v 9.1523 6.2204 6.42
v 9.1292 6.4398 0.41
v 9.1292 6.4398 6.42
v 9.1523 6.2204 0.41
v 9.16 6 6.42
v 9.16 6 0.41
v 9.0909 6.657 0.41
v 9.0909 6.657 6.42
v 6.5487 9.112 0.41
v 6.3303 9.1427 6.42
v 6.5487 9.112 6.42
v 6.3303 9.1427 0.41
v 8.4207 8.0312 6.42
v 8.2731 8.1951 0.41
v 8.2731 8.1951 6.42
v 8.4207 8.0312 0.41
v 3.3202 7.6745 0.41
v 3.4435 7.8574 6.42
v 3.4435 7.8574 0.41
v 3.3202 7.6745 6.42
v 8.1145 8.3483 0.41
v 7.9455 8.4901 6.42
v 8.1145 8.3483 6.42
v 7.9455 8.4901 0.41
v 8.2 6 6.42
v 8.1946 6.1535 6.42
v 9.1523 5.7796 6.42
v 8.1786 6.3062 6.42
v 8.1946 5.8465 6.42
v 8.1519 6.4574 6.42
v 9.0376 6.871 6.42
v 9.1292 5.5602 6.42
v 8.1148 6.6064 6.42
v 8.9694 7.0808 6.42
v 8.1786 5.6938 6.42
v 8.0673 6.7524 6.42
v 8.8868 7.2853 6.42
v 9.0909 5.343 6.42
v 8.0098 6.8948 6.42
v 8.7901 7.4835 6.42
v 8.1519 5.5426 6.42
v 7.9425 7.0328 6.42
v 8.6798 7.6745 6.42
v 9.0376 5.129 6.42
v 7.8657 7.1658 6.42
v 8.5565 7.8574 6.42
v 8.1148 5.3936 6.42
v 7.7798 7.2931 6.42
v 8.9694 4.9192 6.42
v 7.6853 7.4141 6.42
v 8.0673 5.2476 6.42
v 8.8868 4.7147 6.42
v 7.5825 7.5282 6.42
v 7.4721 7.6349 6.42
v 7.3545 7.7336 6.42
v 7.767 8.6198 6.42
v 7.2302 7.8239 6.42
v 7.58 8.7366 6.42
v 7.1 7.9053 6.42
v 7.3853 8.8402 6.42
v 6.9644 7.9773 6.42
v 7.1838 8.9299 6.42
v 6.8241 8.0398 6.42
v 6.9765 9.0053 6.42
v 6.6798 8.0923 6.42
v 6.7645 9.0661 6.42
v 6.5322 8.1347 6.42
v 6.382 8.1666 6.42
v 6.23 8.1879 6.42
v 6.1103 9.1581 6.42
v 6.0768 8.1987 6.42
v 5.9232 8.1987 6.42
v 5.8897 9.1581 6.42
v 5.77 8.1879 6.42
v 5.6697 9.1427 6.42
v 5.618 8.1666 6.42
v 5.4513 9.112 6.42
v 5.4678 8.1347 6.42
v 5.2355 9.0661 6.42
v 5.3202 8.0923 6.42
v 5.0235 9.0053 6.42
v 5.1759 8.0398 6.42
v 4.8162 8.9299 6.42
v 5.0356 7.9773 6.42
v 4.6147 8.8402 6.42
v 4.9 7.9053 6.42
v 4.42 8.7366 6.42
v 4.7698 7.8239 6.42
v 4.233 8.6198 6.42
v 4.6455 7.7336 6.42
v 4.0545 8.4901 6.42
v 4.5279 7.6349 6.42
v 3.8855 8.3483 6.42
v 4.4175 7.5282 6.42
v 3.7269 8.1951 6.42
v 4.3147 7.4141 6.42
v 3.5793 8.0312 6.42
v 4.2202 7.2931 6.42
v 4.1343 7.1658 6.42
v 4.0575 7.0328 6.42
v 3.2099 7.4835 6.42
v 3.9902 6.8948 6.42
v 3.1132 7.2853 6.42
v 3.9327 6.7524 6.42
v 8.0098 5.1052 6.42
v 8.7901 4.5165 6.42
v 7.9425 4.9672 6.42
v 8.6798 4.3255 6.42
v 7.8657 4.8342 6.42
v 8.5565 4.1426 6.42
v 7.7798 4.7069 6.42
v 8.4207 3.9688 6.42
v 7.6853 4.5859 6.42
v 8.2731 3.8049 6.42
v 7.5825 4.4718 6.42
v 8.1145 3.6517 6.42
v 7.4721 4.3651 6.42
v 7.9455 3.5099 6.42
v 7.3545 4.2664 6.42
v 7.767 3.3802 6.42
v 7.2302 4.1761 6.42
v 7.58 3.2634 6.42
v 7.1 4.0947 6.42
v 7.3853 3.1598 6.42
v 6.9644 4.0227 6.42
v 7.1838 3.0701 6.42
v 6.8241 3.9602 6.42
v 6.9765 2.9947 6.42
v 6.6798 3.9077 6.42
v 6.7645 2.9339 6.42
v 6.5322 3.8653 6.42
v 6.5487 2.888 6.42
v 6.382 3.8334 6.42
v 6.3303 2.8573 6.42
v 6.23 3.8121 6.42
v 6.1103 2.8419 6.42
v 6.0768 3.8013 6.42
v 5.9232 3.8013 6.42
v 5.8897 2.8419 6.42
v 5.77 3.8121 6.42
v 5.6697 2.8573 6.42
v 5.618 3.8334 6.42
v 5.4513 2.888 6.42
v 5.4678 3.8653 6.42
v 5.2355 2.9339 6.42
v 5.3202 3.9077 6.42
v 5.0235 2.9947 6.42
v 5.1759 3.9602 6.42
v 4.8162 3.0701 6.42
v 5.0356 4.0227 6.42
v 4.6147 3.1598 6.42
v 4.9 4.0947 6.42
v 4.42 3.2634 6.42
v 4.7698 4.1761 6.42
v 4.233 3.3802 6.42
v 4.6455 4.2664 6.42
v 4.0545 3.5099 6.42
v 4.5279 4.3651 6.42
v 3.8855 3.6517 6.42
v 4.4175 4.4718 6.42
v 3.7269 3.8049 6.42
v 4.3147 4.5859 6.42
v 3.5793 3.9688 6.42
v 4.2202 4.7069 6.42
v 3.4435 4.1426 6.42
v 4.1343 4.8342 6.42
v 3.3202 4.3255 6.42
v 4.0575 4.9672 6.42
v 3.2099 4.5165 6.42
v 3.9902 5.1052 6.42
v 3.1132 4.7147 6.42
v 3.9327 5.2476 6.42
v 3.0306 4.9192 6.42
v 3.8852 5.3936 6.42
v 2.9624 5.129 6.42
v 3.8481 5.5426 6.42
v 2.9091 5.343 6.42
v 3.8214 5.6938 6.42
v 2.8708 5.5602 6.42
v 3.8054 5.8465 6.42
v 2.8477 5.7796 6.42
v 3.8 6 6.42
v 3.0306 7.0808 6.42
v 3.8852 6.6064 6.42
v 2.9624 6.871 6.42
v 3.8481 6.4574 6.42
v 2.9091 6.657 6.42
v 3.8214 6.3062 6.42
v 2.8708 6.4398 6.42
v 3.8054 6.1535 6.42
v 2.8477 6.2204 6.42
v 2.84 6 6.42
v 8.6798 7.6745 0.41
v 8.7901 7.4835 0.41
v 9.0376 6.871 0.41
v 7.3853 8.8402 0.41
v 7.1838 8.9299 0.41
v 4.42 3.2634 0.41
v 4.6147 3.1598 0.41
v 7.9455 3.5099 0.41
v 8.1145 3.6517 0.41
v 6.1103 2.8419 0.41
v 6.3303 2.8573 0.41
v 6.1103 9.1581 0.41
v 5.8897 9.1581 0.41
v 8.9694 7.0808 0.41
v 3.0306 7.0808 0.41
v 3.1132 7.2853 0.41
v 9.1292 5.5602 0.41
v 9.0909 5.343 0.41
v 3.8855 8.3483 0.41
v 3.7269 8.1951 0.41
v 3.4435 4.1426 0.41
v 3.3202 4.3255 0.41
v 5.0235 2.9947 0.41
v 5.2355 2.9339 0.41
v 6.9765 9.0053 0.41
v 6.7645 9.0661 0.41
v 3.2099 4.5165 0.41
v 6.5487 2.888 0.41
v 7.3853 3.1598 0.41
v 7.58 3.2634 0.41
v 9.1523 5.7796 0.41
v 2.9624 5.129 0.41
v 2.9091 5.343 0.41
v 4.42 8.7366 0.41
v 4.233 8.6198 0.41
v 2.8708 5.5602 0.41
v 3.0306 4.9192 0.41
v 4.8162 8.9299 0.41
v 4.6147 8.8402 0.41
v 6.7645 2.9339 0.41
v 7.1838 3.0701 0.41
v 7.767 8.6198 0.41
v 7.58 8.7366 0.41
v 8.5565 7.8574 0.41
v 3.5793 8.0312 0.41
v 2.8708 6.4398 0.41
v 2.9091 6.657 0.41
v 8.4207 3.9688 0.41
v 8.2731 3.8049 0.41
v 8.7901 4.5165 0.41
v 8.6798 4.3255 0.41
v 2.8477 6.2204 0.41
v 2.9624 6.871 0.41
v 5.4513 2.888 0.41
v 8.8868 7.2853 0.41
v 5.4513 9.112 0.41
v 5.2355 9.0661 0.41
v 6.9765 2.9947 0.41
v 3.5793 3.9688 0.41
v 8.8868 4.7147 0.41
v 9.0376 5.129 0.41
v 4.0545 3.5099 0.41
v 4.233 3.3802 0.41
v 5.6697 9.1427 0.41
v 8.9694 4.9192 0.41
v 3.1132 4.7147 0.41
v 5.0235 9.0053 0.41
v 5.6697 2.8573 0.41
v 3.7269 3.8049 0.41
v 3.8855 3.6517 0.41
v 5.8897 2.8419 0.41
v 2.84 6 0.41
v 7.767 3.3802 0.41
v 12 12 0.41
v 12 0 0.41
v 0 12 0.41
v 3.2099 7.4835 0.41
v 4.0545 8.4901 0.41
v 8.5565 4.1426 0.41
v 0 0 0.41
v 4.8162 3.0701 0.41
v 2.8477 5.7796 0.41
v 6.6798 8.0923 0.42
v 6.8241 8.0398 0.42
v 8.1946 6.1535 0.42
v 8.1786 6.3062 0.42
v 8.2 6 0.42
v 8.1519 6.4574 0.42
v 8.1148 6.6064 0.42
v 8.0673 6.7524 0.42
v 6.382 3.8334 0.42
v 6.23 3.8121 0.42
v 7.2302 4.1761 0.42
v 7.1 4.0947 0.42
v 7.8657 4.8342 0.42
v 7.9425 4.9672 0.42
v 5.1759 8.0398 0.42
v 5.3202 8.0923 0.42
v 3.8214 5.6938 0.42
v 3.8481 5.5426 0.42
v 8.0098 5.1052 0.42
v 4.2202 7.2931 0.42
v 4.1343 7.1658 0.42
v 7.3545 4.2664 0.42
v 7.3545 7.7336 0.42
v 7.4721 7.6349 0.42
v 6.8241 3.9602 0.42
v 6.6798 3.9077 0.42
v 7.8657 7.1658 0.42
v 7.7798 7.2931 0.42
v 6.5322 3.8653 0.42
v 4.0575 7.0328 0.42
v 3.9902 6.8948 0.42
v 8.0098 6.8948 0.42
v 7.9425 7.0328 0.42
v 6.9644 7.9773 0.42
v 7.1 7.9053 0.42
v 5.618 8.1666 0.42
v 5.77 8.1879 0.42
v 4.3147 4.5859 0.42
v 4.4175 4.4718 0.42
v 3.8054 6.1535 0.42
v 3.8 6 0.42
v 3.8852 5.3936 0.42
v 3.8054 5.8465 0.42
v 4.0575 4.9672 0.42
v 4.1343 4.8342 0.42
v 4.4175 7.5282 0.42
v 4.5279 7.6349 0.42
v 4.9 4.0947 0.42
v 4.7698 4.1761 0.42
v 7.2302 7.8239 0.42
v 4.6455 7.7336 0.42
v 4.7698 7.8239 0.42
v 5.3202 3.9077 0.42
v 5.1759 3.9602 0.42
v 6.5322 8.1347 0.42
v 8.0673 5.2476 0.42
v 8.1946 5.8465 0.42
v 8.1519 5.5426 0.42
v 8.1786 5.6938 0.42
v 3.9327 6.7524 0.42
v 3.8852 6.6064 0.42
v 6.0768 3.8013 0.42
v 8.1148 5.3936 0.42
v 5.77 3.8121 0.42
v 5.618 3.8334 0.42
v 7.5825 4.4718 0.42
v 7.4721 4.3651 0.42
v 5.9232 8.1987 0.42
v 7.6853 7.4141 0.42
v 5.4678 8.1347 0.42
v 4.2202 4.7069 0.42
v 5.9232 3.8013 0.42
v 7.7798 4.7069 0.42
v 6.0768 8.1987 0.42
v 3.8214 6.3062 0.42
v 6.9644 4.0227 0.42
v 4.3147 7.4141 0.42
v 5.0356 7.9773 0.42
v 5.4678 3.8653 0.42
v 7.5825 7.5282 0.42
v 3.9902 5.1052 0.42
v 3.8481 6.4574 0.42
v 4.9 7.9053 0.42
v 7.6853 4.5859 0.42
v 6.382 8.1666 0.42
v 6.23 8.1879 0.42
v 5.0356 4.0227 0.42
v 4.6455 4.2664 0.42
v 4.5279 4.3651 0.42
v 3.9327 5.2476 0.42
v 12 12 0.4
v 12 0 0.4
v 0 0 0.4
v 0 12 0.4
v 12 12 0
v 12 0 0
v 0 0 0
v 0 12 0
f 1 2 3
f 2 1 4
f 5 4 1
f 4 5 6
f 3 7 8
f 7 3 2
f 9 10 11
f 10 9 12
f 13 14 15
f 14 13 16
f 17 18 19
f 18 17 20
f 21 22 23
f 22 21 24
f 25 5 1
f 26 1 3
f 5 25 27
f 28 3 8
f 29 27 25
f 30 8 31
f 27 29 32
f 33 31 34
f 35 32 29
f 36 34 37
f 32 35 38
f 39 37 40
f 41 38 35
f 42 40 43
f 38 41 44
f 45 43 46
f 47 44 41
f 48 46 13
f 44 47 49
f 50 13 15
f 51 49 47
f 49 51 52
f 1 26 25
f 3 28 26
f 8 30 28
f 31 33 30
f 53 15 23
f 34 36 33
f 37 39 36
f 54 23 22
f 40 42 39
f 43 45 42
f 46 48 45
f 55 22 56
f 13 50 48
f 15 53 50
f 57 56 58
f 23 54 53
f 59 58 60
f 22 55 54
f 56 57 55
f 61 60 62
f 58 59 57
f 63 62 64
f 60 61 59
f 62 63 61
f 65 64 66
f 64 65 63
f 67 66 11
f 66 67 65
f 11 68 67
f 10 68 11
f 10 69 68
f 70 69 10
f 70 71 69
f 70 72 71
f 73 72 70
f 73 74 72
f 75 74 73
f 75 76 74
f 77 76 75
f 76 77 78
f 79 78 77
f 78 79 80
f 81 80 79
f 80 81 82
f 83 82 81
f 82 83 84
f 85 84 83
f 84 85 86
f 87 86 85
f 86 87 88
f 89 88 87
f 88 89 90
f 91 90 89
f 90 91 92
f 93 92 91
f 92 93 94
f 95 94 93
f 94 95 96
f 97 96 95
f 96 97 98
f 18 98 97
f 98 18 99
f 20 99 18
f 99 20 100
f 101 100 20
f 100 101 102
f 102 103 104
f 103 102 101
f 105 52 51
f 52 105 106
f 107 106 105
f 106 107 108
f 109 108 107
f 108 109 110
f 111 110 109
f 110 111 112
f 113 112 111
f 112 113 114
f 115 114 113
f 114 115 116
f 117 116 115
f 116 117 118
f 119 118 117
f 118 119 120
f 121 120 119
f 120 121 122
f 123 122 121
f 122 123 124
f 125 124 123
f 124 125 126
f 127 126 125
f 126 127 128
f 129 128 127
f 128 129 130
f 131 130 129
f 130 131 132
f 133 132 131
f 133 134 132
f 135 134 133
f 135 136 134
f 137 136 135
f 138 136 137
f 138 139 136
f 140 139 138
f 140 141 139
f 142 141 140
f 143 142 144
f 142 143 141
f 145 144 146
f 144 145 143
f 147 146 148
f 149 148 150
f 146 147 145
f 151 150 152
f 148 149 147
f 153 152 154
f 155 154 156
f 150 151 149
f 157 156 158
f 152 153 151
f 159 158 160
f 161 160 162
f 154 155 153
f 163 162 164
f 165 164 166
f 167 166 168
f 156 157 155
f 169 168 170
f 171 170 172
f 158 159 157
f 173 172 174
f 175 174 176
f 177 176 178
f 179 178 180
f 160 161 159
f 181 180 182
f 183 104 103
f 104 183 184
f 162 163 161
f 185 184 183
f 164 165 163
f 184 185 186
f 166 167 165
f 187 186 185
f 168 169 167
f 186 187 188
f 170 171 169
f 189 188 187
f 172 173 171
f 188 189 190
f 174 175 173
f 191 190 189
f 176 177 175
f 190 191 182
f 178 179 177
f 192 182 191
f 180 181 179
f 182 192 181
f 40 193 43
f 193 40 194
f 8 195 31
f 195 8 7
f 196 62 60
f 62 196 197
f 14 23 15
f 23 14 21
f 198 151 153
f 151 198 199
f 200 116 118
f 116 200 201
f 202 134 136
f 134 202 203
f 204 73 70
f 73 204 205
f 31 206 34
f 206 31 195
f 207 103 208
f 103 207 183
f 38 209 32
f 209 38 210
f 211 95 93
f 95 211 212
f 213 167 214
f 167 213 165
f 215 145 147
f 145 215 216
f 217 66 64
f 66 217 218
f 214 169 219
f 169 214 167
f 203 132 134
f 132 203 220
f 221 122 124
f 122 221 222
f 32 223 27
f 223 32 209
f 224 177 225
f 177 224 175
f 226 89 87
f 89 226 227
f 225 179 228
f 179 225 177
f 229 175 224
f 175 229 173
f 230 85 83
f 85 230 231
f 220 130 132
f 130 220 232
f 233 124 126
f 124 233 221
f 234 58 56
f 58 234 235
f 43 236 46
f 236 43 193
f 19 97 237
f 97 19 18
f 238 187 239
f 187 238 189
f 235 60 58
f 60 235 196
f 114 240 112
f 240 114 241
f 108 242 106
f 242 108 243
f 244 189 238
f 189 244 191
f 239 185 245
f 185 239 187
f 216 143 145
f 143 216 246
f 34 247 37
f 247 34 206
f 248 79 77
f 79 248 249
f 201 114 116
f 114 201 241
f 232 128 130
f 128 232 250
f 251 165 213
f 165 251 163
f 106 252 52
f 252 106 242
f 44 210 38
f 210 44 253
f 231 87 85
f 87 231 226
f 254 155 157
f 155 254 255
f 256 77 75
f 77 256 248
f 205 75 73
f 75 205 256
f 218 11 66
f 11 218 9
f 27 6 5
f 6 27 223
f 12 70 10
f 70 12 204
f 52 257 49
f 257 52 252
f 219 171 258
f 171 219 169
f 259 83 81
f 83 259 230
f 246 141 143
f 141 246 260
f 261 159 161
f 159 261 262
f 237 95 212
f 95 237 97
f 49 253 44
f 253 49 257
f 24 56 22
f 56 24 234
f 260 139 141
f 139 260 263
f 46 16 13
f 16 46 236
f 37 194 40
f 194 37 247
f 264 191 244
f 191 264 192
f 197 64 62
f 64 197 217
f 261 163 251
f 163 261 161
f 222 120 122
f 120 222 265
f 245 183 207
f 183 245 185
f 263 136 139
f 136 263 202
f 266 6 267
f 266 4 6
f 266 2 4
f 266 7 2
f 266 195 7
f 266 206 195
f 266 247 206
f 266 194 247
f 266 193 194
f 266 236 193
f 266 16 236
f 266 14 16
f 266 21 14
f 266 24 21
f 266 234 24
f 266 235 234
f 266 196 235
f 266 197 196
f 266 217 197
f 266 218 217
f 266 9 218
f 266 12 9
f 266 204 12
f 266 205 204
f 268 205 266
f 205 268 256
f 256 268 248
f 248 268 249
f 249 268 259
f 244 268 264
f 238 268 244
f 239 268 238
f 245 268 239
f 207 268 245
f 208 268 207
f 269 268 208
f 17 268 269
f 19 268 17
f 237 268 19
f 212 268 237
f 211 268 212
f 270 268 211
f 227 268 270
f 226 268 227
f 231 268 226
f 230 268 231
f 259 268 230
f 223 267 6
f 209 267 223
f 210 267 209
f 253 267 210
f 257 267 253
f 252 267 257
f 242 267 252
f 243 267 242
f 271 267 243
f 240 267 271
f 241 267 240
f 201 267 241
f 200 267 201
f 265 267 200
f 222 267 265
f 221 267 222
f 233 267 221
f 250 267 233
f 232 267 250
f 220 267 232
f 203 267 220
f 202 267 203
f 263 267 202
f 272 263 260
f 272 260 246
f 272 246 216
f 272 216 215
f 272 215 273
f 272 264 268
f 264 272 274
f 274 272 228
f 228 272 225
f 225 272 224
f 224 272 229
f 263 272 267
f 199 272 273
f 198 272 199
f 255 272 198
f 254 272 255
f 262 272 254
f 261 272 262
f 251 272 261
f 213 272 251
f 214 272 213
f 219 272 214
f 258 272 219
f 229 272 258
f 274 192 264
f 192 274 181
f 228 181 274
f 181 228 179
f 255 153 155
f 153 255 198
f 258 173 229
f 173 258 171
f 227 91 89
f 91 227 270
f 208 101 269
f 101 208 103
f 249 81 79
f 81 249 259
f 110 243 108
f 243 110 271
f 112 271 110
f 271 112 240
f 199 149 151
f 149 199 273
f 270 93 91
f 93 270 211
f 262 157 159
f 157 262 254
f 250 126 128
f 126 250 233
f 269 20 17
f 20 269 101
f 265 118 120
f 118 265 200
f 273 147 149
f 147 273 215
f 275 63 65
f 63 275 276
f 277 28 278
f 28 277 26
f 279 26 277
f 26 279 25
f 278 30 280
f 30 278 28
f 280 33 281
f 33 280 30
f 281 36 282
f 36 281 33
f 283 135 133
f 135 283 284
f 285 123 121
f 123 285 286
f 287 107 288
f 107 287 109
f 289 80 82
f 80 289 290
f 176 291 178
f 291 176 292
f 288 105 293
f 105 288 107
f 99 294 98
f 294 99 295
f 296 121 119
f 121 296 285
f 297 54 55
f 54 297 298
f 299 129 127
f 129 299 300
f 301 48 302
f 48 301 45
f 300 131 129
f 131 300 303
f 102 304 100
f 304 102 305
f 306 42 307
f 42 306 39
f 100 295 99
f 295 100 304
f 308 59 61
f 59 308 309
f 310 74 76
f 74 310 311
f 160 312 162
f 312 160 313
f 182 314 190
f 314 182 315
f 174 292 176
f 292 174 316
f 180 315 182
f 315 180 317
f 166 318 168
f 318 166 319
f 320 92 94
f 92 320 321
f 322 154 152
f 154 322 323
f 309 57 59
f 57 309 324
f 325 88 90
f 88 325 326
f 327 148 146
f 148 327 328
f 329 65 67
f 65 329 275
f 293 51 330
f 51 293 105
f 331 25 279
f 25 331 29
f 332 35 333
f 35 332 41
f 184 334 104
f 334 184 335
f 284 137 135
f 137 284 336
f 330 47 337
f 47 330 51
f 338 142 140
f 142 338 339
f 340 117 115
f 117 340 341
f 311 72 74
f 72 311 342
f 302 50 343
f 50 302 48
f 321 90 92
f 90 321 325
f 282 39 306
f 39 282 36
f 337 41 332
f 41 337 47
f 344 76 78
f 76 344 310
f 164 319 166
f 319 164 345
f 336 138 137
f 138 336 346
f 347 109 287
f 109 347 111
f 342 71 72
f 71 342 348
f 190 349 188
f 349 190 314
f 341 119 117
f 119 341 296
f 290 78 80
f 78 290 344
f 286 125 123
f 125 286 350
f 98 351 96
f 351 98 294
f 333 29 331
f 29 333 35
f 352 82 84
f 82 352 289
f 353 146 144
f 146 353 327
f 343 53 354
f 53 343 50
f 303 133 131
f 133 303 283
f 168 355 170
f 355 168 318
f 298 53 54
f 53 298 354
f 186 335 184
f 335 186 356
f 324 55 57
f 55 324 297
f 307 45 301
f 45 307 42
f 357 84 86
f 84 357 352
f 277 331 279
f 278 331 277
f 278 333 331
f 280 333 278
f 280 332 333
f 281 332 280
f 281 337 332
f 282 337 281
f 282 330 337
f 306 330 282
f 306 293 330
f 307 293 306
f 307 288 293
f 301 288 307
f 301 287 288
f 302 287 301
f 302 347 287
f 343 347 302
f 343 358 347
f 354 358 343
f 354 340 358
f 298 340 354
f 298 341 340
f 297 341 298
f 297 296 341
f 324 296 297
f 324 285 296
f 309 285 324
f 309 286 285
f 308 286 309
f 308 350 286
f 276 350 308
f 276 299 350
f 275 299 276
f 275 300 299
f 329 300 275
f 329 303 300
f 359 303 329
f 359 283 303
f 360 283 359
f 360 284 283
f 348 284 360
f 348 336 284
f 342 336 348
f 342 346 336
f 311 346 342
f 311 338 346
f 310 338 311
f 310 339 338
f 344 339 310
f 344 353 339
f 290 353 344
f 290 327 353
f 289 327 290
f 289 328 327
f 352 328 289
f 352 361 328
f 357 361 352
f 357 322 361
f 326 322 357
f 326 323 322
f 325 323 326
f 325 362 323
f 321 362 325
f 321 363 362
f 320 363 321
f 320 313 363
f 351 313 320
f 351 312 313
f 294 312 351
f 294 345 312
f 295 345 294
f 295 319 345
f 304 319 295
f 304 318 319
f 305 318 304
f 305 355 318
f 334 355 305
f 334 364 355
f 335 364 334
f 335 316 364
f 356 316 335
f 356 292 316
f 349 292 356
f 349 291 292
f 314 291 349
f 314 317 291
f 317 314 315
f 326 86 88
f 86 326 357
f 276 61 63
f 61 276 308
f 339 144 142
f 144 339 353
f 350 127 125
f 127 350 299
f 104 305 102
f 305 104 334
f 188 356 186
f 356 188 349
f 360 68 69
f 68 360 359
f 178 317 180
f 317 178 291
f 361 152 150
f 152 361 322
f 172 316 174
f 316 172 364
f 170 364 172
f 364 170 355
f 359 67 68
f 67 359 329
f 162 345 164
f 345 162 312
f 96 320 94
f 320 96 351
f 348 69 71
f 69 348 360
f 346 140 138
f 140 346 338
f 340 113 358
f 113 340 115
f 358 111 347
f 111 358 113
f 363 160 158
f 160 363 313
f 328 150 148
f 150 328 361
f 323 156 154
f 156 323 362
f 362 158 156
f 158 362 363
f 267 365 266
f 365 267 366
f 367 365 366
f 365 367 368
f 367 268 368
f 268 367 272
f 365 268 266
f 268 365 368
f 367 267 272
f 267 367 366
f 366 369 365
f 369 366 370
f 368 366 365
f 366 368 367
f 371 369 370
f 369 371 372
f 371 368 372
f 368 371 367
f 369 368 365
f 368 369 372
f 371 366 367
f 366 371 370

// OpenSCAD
// file: ../../Base/PlacementOptions.scad
// Fischertechnik Box Foundation
// Placement Options

// Alignment
NoAlign = 0;
AlignLeft = 1;
AlignBottom = 2;
AlignCenter = 3;
AlignRight = 4;
AlignTop = 5;

// Element rotation degree steps
rotations = [0, -90, -180, -270];

// Rotation
NoRotation = 0;
Rotate0 = 0;
Rotate90 = 1;
Rotate180 = 2;
Rotate270 = 3;

// Docking (seen from above)
NoDock = -1;
DockLeft = 0;
DockTop = 1;
DockRight = 2;
DockCorner = 2;
DockBottom = 3;

// Web corners
LowerLeft = 0;
UpperLeft = 1;
UpperRight = 2;
LowerRight = 3;

// Web position relative to corner
LeftOfCorner = 0;
RightOfCorner = 1;
// file: ../../Base/Boxes.scad
// Fischertechnik Box Foundation
// Pre-designed Boxes

use <Constants.scad>

include <PlacementOptions.scad>

box190Width = 190;
box190Depth = 130;
box130Width = 130;
box130Depth = 95;
boxUsageHeight = 33.9;
boxWallThickness = 2.4;
boxBaseThickness = 1.0;
boxWebWidth = 3.0;

// getBoxWallThickness()
// Gets the wall thickness of a Fischertechnik Box

function getBoxWallThickness() = boxWallThickness;

// Gets the usable height of a fischertechnik box
function getBoxUsageHeight() = boxUsageHeight;

// Gets the thickness of the Fischertechnik box base.
function getBoxBaseThickness() = boxBaseThickness;

// Gets the width of a box web
function getBoxWebWidth() = boxWebWidth;

// Gets the usable inner space of a Box 190 as an x/y-list
function getBox190Space() = [
    box190Width - 2*getBoxWallThickness(), 
    box190Depth - 2*getBoxWallThickness() ];

// Imports the Fischertechnik empty box 130x190 mm and places it at position 0,0
// 190x130 are the outer sizes, the inner space is slightly smaller. Use getBox190Space() to get the inner sizes.
// This module needs the STL file "Fischertechnik Box 130x190.stl" in the library path.
// The box is positioned that the usable inner space is at the 0,0,0 position. The

module Box190() {
    translate([-getBoxWallThickness(),-getBoxWallThickness(),-getBoxBaseThickness()])
        import("Fischertechnik Box 130x190.stl", convexity=3);
}

// Gets the usable inner space of a Box 130 as an x/y-list
function getBox130Space() = [
    box130Width - 2*getBoxWallThickness(), 
    box130Depth - 2*getBoxWallThickness() ];

// Imports the Fischertechnik empty box 95x130 mm and places it at position 0,0
// 190x130 are the outer sizes, the inner space is slightly smaller. Use getBox190Space() to get the inner sizes.
// This module needs the STL file "Fischertechnik Box 95x130.stl" in the library path.
// The box is positioned that the usable inner space is at the 0,0,0 position. The

module Box130() {
    translate([-getBoxWallThickness(),-getBoxWallThickness(),-getBoxBaseThickness()])
        import("Fischertechnik Box 95x130.stl", convexity=3);
}

// Creates a web at the specified box walls
// corner 0 = LowerLeft, 1 = UpperLeft, 2 = UpperRight, 3 = LowerRight
// side 0 = LeftOfCorner, 1 = RightOfCorner
// distance = Distance in mm from the corner
// box = inner width and depth of the box (default: Box 190)
// webWidth = length of the web (default is 3 mms)
// webThickness = thickness of the web (default is 1 mm)

module BoxWeb(corner, side, distance, box=getBox190Space(), webWidth=getBoxWebWidth(), webThickness=1.0) {
    sink = getBoxWallThickness()/2;

    width = (corner % 2 == 0) ? 
            (side == LeftOfCorner ? webWidth : webThickness) :
            (side == LeftOfCorner ? webThickness : webWidth);

    depth = (corner % 2 == 0) ? 
            (side == RightOfCorner ? webWidth : webThickness) :
            (side == RightOfCorner ? webThickness : webWidth);
    
    xDiff = corner == LowerLeft ? 
                (side == LeftOfCorner ? -sink : distance) :
            (corner == UpperLeft ?                
                (side == LeftOfCorner ? distance : -sink) :
            (corner == UpperRight ?
                (side == LeftOfCorner ? box.x-webWidth+sink : box.x-distance-webThickness) :
                (side == LeftOfCorner ? box.x-distance-webThickness: box.x-webWidth+sink)));

    yDiff = corner == LowerLeft ? 
                (side == RightOfCorner ? -sink : distance) :
            (corner == UpperLeft ?
                (side == RightOfCorner ? box.y-distance : box.y-webWidth+sink) :
            (corner == UpperRight ?
                (side == RightOfCorner ? box.y-webWidth+sink : box.y-distance) :
                (side == RightOfCorner ? distance : -sink)));
    
    translate([xDiff, yDiff, -getExcess()])
        cube([width, depth, boxUsageHeight + 2*getExcess()]);
}
// file: ../../Base/Rotation.scad
// Fischertechnik Box Foundation
// Geometry Helpers Rotation

include <PlacementOptions.scad>

// getRotatedSpace(space, rotation=NoRotation)
// Rotates the space dependent on the specified rotation

function getRotatedSpace(space, rotation=NoRotation) = [
    (rotation == Rotate90 || rotation == Rotate270) ? space.y : space.x,
    (rotation == Rotate90 || rotation == Rotate270) ? space.x : space.y
];

// Rotates the given space around the fixed left lower corner
// space = the space the children needs as width/depth list [width,depth]
// rotation = 0 Rotate0 degrees, 1 Rotate90 degrees, 2 Rotate180 degrees, 3 Rotate270 degrees (equivalent to -90)

module RotateFix(space, rotation=Rotate0) {
    dy = (rotation == Rotate0 || rotation == Rotate270) ? 0 :
        (rotation == Rotate90) ? space.x :
        space.y;
    dx = (rotation < Rotate180) ? 0 :
        (rotation == Rotate180) ? space.x :
        space.y;
    
    translate([dx, dy, 0])
        rotate([0, 0, rotations[rotation]])
            children();
}
// file: ../../Base/Alignment.scad
// Fischertechnik Box Foundation
// Geometry Helpers Alignment

include <PlacementOptions.scad>

// getAlignedX(elementWidth, spaceWidth, align=AlignRight, offset=0)
// Gets the aligned X offset of an element with the given
// width in the given space.
// elementWidth = The width of the element to positon
// spaceWidth = The space where the element should be aligned
// align = 0 AlignLeft, 1 AlignCenter, 2 AlignRight
// offset = an optional offset from the aligned position. When
// aligned left or centered, then positive values are in X direction.
// When aligned right then positive values are in negative X direction.

function getAlignedX(elementWidth, spaceWidth, align=AlignRight, offset=0) =
    (align == AlignLeft) ?
        offset :
        ((align == AlignCenter) ?
        (spaceWidth - elementWidth)/2 + offset :
        spaceWidth - offset - elementWidth);

// getAlignedY(elementDepth, spaceDepth, align=AlignTop, offset=0)
// Gets the aligned Y offset of an element with the given
// depth in the given space.
// elementDepth = The depth of the element to positon
// spaceDepth = The space where the element should be aligned
// align = 0 AlignBottom, 1 AlignCenter, 2 AlignTop
// offset = an optional offset from the aligned position. When
// aligned bottom or centered, then positive values are in Y direction.
// When aligned top then positive values are in negative Y direction.

function getAlignedY(elementDepth, spaceDepth, align=AlignTop, offset=0) =
    (align == AlignBottom) ?
        offset :
        ((align == AlignCenter) ?
        (spaceDepth - elementDepth)/2 + offset :
        spaceDepth - offset - elementDepth);
// file: ../../Base/Placement.scad
// Fischertechnik Box Foundation
// Geometry Helpers Placement

use <Constants.scad>
use <Alignment.scad>
use <Rotation.scad>
use <Boxes.scad>

include <PlacementOptions.scad>

// Place(x=0, y=0, elementSpace=[0,0], alignX=AlignLeft, alignY=AlignBottom, rotation=Rotate0, boxSpace=getBox190Space())
// Places the child at the specified position
// y = Y-Position. This is a relative position when an X aligment is specified.
// x = X-Position. This is a relative position when an Y aligment is specified.
// elementSpace = space of the element to be placed [x,y]
// alignX = -1=NoAlign, 0 AlignLeft, 1 AlignCenter, 3 AlignRight (elementSpace and boxSpace required!)
// alignY = -1=NoAlign, 2 AlignBottom, 1 AlignCenter, 4 AlignTop (elementSpace and boxSpace required!)
// rotation = 0 Rotate0 0 degrees, 1 Rotate90 90 degrees, 
// 2 Rotate180 180 degrees, 3 Rotate270 270 degrees (equivalent to -90)
// boxSpace = Inner space of the box where the placement occurs [x,y] - default is Box 190x130 inner space

module Place(x=0, y=0, elementSpace=[0,0], 
  alignX=AlignLeft, alignY=AlignBottom, 
  rotation=NoRotation, boxSpace=getBox190Space()) {

    module Position(x, y, space, rotation=Rotate0) {
        translate([x, y, 0])
            RotateFix(space, rotation)
                children();
    }

    space = getRotatedSpace(elementSpace, rotation);
    alignedX = getAlignedX(space.x, boxSpace.x, alignX, x);
    alignedY = getAlignedY(space.y, boxSpace.y, alignY, y);
    Position(alignedX, alignedY, elementSpace, rotation)
        children();
}

// Center(space=getBox130Space(), elementSpace=[0,0])
// space = Space where the children is centered. For cylinder use centered=true and no elementSpace.
// elementSpace = space of the element to be centered [x,y]

module Center(space=getBox190Space(), elementSpace=[0,0]) {
    translate([(space.x - elementSpace.x) / 2, (space.y - elementSpace.y) / 2])
        children(0);
}

// CenterHorizontal(width=0, y=0, offset=0, space=getBox130Space())
// space = Space where the children is centered. For cylinder use centered=true and no elementSpace.
// elementSpace = space of the element to be centered [x,y]

module CenterHorizontal(width=0, y=0, offset=0, space=getBox190Space()) {
    translate([(space.x - width) / 2 + offset, y])
        children(0);
}

// CenterVertical(depth=0, x=0, offset=0, space=getBox130Space())
// space = Space where the children is centered. For cylinder use centered=true and no elementSpace.
// elementSpace = space of the element to be centered [x,y]

module CenterVertical(depth=0, x=0, offset=0, space=getBox190Space()) {
    translate([x, (space.y - depth) / 2 + offset])
        children(0);
}
// file: ../../Elements/AxisClip10.scad
// Fischertechnik Box Library
// Axis for clip 10
// 31023

use <../ModelBase/Simple.scad>

width = 12;
depth = 12;
height = 23;

// getAxisClip10Space()
// Gets the space of a frame for a clip 10 with spring ring (mot2)

function getAxisClip10Space() = [width, depth, height];

// AxisClip10()
// Axis for clip 10 with spring ring (mot2)

module AxisClip10() {
    LeveledAxisWithSpace(height, height-10, getAxisClip10Space());
}

// Tests
color("lightgray")
AxisClip10();
// file: ../../Base/Constants.scad
// Fischertechnik Box Foundation
// Constants

// Constant values necessary for multiple elements

// Base constants
dividerThickness = 1.2;
excess = 0.01;
fragments = 90;
tolerance = 0.8;

// Gets the thickness of a divider 
function getDividerThickness() = dividerThickness;

// Gets the excess that is used to merge walls into each other
function getExcess() = excess;

// Gets amount of fragments of a cylinder
function getFragments() = fragments;

// Gets the inner tolerance of a frame to each side
function getTolerance() = tolerance;


// Fischertechnik specific constants
axisDiameter = 4;
axisBottomDiameter = axisDiameter + 1;
standardEdgeDistance = 2.5;
standardWebDistance = 11.5;
standardCornerLength = 15;
tubeWallFactor = 0.8;

// Gets axis diameter
function getAxisDiameter() = axisDiameter;

// Gets axis bottom diameter for thicker part at the bottom
function getAxisBottomDiameter() = axisBottomDiameter;

// gets the standard distance to the wall of the box for dockable frames with webs
function getStandardEdgeDistance() = standardEdgeDistance;

// gets the standard distance of each web to the corner of the dockable frame
function getStandardWebDistance() = standardWebDistance;

// gets the standard length of the corner walls of a dockable frame
function getStandardCornerLength() = standardCornerLength;

// gets the wall thickness of a tube.
function getTubeWallThickness() = tubeWallFactor * getDividerThickness();
// file: ../../Elements/CylinderAxis30.scad
// Fischertechnik Box Library
// Cylinder for standing 30 mm axis
// 31034

use <../Base/Constants.scad>
use <../Base/Placement.scad>
use <../ModelBase/Simple.scad>
use <../ModelBase/Complex.scad>

width = 12;
depth = 12;
height = 6;

// getCylinderAxis30Space()
// Gets the space the cylinder for a 30 mm axis needs

function getCylinderAxis30Space() = [width, depth, height];

// CylinderAxis30()
// Standing cylinder for axis 30
// 31034

module CylinderAxis30() {
    Space(getCylinderAxis30Space());
    
    Center(getCylinderAxis30Space())
        Tube(height, innerDiameter=getFrameAxisDepth());
}

// Tests
color("lightgray")
CylinderAxis30();
// file: ../TestPrint.scad
// 3D Print Test Base

use <../Base/Constants.scad>

use <../Elements/AxisClip10.scad>

module TestPrint(elementSpace) {
    cube([elementSpace.x, elementSpace.y, 0.4]);
    translate([0,0,0.4+getExcess()]) {
        children();
    }
}

TestPrint(getAxisClip10Space())
    AxisClip10();
// main file
// 3D Print Test
// CylinderAxis30

use <../TestPrint.scad>
use <../../Elements/CylinderAxis30.scad>

TestPrint(getCylinderAxis30Space())
    CylinderAxis30();
